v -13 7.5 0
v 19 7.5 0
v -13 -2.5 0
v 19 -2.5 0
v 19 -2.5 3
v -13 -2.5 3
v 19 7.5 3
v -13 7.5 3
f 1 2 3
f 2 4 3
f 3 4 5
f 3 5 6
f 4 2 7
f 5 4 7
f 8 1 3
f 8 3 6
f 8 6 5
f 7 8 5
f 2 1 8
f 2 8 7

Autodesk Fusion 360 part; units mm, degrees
sketch "Sketch1" plane through (0, 0, 0) normal (0, 0, 1) x (1, 0, 0)
  line L0 (-13, 2.5) -> (13, 2.5)
  line L1 (13, 2.5) -> (13, -2.5)
  line L2 (13, -2.5) -> (-13, -2.5)
  line L3 (-13, -2.5) -> (-13, 2.5)
  line L4 (-13, 2.5) -> (13, -2.5) construction
  line L5 (13, 2.5) -> (-13, -2.5) construction
  dimension "d1" = 26
  dimension "d2" = 5
extrude "Extrude1" add sketch "Sketch1" along normal blind 3
extrude "Extrude2" add 1 faces at (13, 0.8333, 1) along direction (1, 0, 0) blind 6
extrude "Extrude3" add 1 faces at (-2.3333, 2.5, 1) along direction (0, 1, 0) blind 5
